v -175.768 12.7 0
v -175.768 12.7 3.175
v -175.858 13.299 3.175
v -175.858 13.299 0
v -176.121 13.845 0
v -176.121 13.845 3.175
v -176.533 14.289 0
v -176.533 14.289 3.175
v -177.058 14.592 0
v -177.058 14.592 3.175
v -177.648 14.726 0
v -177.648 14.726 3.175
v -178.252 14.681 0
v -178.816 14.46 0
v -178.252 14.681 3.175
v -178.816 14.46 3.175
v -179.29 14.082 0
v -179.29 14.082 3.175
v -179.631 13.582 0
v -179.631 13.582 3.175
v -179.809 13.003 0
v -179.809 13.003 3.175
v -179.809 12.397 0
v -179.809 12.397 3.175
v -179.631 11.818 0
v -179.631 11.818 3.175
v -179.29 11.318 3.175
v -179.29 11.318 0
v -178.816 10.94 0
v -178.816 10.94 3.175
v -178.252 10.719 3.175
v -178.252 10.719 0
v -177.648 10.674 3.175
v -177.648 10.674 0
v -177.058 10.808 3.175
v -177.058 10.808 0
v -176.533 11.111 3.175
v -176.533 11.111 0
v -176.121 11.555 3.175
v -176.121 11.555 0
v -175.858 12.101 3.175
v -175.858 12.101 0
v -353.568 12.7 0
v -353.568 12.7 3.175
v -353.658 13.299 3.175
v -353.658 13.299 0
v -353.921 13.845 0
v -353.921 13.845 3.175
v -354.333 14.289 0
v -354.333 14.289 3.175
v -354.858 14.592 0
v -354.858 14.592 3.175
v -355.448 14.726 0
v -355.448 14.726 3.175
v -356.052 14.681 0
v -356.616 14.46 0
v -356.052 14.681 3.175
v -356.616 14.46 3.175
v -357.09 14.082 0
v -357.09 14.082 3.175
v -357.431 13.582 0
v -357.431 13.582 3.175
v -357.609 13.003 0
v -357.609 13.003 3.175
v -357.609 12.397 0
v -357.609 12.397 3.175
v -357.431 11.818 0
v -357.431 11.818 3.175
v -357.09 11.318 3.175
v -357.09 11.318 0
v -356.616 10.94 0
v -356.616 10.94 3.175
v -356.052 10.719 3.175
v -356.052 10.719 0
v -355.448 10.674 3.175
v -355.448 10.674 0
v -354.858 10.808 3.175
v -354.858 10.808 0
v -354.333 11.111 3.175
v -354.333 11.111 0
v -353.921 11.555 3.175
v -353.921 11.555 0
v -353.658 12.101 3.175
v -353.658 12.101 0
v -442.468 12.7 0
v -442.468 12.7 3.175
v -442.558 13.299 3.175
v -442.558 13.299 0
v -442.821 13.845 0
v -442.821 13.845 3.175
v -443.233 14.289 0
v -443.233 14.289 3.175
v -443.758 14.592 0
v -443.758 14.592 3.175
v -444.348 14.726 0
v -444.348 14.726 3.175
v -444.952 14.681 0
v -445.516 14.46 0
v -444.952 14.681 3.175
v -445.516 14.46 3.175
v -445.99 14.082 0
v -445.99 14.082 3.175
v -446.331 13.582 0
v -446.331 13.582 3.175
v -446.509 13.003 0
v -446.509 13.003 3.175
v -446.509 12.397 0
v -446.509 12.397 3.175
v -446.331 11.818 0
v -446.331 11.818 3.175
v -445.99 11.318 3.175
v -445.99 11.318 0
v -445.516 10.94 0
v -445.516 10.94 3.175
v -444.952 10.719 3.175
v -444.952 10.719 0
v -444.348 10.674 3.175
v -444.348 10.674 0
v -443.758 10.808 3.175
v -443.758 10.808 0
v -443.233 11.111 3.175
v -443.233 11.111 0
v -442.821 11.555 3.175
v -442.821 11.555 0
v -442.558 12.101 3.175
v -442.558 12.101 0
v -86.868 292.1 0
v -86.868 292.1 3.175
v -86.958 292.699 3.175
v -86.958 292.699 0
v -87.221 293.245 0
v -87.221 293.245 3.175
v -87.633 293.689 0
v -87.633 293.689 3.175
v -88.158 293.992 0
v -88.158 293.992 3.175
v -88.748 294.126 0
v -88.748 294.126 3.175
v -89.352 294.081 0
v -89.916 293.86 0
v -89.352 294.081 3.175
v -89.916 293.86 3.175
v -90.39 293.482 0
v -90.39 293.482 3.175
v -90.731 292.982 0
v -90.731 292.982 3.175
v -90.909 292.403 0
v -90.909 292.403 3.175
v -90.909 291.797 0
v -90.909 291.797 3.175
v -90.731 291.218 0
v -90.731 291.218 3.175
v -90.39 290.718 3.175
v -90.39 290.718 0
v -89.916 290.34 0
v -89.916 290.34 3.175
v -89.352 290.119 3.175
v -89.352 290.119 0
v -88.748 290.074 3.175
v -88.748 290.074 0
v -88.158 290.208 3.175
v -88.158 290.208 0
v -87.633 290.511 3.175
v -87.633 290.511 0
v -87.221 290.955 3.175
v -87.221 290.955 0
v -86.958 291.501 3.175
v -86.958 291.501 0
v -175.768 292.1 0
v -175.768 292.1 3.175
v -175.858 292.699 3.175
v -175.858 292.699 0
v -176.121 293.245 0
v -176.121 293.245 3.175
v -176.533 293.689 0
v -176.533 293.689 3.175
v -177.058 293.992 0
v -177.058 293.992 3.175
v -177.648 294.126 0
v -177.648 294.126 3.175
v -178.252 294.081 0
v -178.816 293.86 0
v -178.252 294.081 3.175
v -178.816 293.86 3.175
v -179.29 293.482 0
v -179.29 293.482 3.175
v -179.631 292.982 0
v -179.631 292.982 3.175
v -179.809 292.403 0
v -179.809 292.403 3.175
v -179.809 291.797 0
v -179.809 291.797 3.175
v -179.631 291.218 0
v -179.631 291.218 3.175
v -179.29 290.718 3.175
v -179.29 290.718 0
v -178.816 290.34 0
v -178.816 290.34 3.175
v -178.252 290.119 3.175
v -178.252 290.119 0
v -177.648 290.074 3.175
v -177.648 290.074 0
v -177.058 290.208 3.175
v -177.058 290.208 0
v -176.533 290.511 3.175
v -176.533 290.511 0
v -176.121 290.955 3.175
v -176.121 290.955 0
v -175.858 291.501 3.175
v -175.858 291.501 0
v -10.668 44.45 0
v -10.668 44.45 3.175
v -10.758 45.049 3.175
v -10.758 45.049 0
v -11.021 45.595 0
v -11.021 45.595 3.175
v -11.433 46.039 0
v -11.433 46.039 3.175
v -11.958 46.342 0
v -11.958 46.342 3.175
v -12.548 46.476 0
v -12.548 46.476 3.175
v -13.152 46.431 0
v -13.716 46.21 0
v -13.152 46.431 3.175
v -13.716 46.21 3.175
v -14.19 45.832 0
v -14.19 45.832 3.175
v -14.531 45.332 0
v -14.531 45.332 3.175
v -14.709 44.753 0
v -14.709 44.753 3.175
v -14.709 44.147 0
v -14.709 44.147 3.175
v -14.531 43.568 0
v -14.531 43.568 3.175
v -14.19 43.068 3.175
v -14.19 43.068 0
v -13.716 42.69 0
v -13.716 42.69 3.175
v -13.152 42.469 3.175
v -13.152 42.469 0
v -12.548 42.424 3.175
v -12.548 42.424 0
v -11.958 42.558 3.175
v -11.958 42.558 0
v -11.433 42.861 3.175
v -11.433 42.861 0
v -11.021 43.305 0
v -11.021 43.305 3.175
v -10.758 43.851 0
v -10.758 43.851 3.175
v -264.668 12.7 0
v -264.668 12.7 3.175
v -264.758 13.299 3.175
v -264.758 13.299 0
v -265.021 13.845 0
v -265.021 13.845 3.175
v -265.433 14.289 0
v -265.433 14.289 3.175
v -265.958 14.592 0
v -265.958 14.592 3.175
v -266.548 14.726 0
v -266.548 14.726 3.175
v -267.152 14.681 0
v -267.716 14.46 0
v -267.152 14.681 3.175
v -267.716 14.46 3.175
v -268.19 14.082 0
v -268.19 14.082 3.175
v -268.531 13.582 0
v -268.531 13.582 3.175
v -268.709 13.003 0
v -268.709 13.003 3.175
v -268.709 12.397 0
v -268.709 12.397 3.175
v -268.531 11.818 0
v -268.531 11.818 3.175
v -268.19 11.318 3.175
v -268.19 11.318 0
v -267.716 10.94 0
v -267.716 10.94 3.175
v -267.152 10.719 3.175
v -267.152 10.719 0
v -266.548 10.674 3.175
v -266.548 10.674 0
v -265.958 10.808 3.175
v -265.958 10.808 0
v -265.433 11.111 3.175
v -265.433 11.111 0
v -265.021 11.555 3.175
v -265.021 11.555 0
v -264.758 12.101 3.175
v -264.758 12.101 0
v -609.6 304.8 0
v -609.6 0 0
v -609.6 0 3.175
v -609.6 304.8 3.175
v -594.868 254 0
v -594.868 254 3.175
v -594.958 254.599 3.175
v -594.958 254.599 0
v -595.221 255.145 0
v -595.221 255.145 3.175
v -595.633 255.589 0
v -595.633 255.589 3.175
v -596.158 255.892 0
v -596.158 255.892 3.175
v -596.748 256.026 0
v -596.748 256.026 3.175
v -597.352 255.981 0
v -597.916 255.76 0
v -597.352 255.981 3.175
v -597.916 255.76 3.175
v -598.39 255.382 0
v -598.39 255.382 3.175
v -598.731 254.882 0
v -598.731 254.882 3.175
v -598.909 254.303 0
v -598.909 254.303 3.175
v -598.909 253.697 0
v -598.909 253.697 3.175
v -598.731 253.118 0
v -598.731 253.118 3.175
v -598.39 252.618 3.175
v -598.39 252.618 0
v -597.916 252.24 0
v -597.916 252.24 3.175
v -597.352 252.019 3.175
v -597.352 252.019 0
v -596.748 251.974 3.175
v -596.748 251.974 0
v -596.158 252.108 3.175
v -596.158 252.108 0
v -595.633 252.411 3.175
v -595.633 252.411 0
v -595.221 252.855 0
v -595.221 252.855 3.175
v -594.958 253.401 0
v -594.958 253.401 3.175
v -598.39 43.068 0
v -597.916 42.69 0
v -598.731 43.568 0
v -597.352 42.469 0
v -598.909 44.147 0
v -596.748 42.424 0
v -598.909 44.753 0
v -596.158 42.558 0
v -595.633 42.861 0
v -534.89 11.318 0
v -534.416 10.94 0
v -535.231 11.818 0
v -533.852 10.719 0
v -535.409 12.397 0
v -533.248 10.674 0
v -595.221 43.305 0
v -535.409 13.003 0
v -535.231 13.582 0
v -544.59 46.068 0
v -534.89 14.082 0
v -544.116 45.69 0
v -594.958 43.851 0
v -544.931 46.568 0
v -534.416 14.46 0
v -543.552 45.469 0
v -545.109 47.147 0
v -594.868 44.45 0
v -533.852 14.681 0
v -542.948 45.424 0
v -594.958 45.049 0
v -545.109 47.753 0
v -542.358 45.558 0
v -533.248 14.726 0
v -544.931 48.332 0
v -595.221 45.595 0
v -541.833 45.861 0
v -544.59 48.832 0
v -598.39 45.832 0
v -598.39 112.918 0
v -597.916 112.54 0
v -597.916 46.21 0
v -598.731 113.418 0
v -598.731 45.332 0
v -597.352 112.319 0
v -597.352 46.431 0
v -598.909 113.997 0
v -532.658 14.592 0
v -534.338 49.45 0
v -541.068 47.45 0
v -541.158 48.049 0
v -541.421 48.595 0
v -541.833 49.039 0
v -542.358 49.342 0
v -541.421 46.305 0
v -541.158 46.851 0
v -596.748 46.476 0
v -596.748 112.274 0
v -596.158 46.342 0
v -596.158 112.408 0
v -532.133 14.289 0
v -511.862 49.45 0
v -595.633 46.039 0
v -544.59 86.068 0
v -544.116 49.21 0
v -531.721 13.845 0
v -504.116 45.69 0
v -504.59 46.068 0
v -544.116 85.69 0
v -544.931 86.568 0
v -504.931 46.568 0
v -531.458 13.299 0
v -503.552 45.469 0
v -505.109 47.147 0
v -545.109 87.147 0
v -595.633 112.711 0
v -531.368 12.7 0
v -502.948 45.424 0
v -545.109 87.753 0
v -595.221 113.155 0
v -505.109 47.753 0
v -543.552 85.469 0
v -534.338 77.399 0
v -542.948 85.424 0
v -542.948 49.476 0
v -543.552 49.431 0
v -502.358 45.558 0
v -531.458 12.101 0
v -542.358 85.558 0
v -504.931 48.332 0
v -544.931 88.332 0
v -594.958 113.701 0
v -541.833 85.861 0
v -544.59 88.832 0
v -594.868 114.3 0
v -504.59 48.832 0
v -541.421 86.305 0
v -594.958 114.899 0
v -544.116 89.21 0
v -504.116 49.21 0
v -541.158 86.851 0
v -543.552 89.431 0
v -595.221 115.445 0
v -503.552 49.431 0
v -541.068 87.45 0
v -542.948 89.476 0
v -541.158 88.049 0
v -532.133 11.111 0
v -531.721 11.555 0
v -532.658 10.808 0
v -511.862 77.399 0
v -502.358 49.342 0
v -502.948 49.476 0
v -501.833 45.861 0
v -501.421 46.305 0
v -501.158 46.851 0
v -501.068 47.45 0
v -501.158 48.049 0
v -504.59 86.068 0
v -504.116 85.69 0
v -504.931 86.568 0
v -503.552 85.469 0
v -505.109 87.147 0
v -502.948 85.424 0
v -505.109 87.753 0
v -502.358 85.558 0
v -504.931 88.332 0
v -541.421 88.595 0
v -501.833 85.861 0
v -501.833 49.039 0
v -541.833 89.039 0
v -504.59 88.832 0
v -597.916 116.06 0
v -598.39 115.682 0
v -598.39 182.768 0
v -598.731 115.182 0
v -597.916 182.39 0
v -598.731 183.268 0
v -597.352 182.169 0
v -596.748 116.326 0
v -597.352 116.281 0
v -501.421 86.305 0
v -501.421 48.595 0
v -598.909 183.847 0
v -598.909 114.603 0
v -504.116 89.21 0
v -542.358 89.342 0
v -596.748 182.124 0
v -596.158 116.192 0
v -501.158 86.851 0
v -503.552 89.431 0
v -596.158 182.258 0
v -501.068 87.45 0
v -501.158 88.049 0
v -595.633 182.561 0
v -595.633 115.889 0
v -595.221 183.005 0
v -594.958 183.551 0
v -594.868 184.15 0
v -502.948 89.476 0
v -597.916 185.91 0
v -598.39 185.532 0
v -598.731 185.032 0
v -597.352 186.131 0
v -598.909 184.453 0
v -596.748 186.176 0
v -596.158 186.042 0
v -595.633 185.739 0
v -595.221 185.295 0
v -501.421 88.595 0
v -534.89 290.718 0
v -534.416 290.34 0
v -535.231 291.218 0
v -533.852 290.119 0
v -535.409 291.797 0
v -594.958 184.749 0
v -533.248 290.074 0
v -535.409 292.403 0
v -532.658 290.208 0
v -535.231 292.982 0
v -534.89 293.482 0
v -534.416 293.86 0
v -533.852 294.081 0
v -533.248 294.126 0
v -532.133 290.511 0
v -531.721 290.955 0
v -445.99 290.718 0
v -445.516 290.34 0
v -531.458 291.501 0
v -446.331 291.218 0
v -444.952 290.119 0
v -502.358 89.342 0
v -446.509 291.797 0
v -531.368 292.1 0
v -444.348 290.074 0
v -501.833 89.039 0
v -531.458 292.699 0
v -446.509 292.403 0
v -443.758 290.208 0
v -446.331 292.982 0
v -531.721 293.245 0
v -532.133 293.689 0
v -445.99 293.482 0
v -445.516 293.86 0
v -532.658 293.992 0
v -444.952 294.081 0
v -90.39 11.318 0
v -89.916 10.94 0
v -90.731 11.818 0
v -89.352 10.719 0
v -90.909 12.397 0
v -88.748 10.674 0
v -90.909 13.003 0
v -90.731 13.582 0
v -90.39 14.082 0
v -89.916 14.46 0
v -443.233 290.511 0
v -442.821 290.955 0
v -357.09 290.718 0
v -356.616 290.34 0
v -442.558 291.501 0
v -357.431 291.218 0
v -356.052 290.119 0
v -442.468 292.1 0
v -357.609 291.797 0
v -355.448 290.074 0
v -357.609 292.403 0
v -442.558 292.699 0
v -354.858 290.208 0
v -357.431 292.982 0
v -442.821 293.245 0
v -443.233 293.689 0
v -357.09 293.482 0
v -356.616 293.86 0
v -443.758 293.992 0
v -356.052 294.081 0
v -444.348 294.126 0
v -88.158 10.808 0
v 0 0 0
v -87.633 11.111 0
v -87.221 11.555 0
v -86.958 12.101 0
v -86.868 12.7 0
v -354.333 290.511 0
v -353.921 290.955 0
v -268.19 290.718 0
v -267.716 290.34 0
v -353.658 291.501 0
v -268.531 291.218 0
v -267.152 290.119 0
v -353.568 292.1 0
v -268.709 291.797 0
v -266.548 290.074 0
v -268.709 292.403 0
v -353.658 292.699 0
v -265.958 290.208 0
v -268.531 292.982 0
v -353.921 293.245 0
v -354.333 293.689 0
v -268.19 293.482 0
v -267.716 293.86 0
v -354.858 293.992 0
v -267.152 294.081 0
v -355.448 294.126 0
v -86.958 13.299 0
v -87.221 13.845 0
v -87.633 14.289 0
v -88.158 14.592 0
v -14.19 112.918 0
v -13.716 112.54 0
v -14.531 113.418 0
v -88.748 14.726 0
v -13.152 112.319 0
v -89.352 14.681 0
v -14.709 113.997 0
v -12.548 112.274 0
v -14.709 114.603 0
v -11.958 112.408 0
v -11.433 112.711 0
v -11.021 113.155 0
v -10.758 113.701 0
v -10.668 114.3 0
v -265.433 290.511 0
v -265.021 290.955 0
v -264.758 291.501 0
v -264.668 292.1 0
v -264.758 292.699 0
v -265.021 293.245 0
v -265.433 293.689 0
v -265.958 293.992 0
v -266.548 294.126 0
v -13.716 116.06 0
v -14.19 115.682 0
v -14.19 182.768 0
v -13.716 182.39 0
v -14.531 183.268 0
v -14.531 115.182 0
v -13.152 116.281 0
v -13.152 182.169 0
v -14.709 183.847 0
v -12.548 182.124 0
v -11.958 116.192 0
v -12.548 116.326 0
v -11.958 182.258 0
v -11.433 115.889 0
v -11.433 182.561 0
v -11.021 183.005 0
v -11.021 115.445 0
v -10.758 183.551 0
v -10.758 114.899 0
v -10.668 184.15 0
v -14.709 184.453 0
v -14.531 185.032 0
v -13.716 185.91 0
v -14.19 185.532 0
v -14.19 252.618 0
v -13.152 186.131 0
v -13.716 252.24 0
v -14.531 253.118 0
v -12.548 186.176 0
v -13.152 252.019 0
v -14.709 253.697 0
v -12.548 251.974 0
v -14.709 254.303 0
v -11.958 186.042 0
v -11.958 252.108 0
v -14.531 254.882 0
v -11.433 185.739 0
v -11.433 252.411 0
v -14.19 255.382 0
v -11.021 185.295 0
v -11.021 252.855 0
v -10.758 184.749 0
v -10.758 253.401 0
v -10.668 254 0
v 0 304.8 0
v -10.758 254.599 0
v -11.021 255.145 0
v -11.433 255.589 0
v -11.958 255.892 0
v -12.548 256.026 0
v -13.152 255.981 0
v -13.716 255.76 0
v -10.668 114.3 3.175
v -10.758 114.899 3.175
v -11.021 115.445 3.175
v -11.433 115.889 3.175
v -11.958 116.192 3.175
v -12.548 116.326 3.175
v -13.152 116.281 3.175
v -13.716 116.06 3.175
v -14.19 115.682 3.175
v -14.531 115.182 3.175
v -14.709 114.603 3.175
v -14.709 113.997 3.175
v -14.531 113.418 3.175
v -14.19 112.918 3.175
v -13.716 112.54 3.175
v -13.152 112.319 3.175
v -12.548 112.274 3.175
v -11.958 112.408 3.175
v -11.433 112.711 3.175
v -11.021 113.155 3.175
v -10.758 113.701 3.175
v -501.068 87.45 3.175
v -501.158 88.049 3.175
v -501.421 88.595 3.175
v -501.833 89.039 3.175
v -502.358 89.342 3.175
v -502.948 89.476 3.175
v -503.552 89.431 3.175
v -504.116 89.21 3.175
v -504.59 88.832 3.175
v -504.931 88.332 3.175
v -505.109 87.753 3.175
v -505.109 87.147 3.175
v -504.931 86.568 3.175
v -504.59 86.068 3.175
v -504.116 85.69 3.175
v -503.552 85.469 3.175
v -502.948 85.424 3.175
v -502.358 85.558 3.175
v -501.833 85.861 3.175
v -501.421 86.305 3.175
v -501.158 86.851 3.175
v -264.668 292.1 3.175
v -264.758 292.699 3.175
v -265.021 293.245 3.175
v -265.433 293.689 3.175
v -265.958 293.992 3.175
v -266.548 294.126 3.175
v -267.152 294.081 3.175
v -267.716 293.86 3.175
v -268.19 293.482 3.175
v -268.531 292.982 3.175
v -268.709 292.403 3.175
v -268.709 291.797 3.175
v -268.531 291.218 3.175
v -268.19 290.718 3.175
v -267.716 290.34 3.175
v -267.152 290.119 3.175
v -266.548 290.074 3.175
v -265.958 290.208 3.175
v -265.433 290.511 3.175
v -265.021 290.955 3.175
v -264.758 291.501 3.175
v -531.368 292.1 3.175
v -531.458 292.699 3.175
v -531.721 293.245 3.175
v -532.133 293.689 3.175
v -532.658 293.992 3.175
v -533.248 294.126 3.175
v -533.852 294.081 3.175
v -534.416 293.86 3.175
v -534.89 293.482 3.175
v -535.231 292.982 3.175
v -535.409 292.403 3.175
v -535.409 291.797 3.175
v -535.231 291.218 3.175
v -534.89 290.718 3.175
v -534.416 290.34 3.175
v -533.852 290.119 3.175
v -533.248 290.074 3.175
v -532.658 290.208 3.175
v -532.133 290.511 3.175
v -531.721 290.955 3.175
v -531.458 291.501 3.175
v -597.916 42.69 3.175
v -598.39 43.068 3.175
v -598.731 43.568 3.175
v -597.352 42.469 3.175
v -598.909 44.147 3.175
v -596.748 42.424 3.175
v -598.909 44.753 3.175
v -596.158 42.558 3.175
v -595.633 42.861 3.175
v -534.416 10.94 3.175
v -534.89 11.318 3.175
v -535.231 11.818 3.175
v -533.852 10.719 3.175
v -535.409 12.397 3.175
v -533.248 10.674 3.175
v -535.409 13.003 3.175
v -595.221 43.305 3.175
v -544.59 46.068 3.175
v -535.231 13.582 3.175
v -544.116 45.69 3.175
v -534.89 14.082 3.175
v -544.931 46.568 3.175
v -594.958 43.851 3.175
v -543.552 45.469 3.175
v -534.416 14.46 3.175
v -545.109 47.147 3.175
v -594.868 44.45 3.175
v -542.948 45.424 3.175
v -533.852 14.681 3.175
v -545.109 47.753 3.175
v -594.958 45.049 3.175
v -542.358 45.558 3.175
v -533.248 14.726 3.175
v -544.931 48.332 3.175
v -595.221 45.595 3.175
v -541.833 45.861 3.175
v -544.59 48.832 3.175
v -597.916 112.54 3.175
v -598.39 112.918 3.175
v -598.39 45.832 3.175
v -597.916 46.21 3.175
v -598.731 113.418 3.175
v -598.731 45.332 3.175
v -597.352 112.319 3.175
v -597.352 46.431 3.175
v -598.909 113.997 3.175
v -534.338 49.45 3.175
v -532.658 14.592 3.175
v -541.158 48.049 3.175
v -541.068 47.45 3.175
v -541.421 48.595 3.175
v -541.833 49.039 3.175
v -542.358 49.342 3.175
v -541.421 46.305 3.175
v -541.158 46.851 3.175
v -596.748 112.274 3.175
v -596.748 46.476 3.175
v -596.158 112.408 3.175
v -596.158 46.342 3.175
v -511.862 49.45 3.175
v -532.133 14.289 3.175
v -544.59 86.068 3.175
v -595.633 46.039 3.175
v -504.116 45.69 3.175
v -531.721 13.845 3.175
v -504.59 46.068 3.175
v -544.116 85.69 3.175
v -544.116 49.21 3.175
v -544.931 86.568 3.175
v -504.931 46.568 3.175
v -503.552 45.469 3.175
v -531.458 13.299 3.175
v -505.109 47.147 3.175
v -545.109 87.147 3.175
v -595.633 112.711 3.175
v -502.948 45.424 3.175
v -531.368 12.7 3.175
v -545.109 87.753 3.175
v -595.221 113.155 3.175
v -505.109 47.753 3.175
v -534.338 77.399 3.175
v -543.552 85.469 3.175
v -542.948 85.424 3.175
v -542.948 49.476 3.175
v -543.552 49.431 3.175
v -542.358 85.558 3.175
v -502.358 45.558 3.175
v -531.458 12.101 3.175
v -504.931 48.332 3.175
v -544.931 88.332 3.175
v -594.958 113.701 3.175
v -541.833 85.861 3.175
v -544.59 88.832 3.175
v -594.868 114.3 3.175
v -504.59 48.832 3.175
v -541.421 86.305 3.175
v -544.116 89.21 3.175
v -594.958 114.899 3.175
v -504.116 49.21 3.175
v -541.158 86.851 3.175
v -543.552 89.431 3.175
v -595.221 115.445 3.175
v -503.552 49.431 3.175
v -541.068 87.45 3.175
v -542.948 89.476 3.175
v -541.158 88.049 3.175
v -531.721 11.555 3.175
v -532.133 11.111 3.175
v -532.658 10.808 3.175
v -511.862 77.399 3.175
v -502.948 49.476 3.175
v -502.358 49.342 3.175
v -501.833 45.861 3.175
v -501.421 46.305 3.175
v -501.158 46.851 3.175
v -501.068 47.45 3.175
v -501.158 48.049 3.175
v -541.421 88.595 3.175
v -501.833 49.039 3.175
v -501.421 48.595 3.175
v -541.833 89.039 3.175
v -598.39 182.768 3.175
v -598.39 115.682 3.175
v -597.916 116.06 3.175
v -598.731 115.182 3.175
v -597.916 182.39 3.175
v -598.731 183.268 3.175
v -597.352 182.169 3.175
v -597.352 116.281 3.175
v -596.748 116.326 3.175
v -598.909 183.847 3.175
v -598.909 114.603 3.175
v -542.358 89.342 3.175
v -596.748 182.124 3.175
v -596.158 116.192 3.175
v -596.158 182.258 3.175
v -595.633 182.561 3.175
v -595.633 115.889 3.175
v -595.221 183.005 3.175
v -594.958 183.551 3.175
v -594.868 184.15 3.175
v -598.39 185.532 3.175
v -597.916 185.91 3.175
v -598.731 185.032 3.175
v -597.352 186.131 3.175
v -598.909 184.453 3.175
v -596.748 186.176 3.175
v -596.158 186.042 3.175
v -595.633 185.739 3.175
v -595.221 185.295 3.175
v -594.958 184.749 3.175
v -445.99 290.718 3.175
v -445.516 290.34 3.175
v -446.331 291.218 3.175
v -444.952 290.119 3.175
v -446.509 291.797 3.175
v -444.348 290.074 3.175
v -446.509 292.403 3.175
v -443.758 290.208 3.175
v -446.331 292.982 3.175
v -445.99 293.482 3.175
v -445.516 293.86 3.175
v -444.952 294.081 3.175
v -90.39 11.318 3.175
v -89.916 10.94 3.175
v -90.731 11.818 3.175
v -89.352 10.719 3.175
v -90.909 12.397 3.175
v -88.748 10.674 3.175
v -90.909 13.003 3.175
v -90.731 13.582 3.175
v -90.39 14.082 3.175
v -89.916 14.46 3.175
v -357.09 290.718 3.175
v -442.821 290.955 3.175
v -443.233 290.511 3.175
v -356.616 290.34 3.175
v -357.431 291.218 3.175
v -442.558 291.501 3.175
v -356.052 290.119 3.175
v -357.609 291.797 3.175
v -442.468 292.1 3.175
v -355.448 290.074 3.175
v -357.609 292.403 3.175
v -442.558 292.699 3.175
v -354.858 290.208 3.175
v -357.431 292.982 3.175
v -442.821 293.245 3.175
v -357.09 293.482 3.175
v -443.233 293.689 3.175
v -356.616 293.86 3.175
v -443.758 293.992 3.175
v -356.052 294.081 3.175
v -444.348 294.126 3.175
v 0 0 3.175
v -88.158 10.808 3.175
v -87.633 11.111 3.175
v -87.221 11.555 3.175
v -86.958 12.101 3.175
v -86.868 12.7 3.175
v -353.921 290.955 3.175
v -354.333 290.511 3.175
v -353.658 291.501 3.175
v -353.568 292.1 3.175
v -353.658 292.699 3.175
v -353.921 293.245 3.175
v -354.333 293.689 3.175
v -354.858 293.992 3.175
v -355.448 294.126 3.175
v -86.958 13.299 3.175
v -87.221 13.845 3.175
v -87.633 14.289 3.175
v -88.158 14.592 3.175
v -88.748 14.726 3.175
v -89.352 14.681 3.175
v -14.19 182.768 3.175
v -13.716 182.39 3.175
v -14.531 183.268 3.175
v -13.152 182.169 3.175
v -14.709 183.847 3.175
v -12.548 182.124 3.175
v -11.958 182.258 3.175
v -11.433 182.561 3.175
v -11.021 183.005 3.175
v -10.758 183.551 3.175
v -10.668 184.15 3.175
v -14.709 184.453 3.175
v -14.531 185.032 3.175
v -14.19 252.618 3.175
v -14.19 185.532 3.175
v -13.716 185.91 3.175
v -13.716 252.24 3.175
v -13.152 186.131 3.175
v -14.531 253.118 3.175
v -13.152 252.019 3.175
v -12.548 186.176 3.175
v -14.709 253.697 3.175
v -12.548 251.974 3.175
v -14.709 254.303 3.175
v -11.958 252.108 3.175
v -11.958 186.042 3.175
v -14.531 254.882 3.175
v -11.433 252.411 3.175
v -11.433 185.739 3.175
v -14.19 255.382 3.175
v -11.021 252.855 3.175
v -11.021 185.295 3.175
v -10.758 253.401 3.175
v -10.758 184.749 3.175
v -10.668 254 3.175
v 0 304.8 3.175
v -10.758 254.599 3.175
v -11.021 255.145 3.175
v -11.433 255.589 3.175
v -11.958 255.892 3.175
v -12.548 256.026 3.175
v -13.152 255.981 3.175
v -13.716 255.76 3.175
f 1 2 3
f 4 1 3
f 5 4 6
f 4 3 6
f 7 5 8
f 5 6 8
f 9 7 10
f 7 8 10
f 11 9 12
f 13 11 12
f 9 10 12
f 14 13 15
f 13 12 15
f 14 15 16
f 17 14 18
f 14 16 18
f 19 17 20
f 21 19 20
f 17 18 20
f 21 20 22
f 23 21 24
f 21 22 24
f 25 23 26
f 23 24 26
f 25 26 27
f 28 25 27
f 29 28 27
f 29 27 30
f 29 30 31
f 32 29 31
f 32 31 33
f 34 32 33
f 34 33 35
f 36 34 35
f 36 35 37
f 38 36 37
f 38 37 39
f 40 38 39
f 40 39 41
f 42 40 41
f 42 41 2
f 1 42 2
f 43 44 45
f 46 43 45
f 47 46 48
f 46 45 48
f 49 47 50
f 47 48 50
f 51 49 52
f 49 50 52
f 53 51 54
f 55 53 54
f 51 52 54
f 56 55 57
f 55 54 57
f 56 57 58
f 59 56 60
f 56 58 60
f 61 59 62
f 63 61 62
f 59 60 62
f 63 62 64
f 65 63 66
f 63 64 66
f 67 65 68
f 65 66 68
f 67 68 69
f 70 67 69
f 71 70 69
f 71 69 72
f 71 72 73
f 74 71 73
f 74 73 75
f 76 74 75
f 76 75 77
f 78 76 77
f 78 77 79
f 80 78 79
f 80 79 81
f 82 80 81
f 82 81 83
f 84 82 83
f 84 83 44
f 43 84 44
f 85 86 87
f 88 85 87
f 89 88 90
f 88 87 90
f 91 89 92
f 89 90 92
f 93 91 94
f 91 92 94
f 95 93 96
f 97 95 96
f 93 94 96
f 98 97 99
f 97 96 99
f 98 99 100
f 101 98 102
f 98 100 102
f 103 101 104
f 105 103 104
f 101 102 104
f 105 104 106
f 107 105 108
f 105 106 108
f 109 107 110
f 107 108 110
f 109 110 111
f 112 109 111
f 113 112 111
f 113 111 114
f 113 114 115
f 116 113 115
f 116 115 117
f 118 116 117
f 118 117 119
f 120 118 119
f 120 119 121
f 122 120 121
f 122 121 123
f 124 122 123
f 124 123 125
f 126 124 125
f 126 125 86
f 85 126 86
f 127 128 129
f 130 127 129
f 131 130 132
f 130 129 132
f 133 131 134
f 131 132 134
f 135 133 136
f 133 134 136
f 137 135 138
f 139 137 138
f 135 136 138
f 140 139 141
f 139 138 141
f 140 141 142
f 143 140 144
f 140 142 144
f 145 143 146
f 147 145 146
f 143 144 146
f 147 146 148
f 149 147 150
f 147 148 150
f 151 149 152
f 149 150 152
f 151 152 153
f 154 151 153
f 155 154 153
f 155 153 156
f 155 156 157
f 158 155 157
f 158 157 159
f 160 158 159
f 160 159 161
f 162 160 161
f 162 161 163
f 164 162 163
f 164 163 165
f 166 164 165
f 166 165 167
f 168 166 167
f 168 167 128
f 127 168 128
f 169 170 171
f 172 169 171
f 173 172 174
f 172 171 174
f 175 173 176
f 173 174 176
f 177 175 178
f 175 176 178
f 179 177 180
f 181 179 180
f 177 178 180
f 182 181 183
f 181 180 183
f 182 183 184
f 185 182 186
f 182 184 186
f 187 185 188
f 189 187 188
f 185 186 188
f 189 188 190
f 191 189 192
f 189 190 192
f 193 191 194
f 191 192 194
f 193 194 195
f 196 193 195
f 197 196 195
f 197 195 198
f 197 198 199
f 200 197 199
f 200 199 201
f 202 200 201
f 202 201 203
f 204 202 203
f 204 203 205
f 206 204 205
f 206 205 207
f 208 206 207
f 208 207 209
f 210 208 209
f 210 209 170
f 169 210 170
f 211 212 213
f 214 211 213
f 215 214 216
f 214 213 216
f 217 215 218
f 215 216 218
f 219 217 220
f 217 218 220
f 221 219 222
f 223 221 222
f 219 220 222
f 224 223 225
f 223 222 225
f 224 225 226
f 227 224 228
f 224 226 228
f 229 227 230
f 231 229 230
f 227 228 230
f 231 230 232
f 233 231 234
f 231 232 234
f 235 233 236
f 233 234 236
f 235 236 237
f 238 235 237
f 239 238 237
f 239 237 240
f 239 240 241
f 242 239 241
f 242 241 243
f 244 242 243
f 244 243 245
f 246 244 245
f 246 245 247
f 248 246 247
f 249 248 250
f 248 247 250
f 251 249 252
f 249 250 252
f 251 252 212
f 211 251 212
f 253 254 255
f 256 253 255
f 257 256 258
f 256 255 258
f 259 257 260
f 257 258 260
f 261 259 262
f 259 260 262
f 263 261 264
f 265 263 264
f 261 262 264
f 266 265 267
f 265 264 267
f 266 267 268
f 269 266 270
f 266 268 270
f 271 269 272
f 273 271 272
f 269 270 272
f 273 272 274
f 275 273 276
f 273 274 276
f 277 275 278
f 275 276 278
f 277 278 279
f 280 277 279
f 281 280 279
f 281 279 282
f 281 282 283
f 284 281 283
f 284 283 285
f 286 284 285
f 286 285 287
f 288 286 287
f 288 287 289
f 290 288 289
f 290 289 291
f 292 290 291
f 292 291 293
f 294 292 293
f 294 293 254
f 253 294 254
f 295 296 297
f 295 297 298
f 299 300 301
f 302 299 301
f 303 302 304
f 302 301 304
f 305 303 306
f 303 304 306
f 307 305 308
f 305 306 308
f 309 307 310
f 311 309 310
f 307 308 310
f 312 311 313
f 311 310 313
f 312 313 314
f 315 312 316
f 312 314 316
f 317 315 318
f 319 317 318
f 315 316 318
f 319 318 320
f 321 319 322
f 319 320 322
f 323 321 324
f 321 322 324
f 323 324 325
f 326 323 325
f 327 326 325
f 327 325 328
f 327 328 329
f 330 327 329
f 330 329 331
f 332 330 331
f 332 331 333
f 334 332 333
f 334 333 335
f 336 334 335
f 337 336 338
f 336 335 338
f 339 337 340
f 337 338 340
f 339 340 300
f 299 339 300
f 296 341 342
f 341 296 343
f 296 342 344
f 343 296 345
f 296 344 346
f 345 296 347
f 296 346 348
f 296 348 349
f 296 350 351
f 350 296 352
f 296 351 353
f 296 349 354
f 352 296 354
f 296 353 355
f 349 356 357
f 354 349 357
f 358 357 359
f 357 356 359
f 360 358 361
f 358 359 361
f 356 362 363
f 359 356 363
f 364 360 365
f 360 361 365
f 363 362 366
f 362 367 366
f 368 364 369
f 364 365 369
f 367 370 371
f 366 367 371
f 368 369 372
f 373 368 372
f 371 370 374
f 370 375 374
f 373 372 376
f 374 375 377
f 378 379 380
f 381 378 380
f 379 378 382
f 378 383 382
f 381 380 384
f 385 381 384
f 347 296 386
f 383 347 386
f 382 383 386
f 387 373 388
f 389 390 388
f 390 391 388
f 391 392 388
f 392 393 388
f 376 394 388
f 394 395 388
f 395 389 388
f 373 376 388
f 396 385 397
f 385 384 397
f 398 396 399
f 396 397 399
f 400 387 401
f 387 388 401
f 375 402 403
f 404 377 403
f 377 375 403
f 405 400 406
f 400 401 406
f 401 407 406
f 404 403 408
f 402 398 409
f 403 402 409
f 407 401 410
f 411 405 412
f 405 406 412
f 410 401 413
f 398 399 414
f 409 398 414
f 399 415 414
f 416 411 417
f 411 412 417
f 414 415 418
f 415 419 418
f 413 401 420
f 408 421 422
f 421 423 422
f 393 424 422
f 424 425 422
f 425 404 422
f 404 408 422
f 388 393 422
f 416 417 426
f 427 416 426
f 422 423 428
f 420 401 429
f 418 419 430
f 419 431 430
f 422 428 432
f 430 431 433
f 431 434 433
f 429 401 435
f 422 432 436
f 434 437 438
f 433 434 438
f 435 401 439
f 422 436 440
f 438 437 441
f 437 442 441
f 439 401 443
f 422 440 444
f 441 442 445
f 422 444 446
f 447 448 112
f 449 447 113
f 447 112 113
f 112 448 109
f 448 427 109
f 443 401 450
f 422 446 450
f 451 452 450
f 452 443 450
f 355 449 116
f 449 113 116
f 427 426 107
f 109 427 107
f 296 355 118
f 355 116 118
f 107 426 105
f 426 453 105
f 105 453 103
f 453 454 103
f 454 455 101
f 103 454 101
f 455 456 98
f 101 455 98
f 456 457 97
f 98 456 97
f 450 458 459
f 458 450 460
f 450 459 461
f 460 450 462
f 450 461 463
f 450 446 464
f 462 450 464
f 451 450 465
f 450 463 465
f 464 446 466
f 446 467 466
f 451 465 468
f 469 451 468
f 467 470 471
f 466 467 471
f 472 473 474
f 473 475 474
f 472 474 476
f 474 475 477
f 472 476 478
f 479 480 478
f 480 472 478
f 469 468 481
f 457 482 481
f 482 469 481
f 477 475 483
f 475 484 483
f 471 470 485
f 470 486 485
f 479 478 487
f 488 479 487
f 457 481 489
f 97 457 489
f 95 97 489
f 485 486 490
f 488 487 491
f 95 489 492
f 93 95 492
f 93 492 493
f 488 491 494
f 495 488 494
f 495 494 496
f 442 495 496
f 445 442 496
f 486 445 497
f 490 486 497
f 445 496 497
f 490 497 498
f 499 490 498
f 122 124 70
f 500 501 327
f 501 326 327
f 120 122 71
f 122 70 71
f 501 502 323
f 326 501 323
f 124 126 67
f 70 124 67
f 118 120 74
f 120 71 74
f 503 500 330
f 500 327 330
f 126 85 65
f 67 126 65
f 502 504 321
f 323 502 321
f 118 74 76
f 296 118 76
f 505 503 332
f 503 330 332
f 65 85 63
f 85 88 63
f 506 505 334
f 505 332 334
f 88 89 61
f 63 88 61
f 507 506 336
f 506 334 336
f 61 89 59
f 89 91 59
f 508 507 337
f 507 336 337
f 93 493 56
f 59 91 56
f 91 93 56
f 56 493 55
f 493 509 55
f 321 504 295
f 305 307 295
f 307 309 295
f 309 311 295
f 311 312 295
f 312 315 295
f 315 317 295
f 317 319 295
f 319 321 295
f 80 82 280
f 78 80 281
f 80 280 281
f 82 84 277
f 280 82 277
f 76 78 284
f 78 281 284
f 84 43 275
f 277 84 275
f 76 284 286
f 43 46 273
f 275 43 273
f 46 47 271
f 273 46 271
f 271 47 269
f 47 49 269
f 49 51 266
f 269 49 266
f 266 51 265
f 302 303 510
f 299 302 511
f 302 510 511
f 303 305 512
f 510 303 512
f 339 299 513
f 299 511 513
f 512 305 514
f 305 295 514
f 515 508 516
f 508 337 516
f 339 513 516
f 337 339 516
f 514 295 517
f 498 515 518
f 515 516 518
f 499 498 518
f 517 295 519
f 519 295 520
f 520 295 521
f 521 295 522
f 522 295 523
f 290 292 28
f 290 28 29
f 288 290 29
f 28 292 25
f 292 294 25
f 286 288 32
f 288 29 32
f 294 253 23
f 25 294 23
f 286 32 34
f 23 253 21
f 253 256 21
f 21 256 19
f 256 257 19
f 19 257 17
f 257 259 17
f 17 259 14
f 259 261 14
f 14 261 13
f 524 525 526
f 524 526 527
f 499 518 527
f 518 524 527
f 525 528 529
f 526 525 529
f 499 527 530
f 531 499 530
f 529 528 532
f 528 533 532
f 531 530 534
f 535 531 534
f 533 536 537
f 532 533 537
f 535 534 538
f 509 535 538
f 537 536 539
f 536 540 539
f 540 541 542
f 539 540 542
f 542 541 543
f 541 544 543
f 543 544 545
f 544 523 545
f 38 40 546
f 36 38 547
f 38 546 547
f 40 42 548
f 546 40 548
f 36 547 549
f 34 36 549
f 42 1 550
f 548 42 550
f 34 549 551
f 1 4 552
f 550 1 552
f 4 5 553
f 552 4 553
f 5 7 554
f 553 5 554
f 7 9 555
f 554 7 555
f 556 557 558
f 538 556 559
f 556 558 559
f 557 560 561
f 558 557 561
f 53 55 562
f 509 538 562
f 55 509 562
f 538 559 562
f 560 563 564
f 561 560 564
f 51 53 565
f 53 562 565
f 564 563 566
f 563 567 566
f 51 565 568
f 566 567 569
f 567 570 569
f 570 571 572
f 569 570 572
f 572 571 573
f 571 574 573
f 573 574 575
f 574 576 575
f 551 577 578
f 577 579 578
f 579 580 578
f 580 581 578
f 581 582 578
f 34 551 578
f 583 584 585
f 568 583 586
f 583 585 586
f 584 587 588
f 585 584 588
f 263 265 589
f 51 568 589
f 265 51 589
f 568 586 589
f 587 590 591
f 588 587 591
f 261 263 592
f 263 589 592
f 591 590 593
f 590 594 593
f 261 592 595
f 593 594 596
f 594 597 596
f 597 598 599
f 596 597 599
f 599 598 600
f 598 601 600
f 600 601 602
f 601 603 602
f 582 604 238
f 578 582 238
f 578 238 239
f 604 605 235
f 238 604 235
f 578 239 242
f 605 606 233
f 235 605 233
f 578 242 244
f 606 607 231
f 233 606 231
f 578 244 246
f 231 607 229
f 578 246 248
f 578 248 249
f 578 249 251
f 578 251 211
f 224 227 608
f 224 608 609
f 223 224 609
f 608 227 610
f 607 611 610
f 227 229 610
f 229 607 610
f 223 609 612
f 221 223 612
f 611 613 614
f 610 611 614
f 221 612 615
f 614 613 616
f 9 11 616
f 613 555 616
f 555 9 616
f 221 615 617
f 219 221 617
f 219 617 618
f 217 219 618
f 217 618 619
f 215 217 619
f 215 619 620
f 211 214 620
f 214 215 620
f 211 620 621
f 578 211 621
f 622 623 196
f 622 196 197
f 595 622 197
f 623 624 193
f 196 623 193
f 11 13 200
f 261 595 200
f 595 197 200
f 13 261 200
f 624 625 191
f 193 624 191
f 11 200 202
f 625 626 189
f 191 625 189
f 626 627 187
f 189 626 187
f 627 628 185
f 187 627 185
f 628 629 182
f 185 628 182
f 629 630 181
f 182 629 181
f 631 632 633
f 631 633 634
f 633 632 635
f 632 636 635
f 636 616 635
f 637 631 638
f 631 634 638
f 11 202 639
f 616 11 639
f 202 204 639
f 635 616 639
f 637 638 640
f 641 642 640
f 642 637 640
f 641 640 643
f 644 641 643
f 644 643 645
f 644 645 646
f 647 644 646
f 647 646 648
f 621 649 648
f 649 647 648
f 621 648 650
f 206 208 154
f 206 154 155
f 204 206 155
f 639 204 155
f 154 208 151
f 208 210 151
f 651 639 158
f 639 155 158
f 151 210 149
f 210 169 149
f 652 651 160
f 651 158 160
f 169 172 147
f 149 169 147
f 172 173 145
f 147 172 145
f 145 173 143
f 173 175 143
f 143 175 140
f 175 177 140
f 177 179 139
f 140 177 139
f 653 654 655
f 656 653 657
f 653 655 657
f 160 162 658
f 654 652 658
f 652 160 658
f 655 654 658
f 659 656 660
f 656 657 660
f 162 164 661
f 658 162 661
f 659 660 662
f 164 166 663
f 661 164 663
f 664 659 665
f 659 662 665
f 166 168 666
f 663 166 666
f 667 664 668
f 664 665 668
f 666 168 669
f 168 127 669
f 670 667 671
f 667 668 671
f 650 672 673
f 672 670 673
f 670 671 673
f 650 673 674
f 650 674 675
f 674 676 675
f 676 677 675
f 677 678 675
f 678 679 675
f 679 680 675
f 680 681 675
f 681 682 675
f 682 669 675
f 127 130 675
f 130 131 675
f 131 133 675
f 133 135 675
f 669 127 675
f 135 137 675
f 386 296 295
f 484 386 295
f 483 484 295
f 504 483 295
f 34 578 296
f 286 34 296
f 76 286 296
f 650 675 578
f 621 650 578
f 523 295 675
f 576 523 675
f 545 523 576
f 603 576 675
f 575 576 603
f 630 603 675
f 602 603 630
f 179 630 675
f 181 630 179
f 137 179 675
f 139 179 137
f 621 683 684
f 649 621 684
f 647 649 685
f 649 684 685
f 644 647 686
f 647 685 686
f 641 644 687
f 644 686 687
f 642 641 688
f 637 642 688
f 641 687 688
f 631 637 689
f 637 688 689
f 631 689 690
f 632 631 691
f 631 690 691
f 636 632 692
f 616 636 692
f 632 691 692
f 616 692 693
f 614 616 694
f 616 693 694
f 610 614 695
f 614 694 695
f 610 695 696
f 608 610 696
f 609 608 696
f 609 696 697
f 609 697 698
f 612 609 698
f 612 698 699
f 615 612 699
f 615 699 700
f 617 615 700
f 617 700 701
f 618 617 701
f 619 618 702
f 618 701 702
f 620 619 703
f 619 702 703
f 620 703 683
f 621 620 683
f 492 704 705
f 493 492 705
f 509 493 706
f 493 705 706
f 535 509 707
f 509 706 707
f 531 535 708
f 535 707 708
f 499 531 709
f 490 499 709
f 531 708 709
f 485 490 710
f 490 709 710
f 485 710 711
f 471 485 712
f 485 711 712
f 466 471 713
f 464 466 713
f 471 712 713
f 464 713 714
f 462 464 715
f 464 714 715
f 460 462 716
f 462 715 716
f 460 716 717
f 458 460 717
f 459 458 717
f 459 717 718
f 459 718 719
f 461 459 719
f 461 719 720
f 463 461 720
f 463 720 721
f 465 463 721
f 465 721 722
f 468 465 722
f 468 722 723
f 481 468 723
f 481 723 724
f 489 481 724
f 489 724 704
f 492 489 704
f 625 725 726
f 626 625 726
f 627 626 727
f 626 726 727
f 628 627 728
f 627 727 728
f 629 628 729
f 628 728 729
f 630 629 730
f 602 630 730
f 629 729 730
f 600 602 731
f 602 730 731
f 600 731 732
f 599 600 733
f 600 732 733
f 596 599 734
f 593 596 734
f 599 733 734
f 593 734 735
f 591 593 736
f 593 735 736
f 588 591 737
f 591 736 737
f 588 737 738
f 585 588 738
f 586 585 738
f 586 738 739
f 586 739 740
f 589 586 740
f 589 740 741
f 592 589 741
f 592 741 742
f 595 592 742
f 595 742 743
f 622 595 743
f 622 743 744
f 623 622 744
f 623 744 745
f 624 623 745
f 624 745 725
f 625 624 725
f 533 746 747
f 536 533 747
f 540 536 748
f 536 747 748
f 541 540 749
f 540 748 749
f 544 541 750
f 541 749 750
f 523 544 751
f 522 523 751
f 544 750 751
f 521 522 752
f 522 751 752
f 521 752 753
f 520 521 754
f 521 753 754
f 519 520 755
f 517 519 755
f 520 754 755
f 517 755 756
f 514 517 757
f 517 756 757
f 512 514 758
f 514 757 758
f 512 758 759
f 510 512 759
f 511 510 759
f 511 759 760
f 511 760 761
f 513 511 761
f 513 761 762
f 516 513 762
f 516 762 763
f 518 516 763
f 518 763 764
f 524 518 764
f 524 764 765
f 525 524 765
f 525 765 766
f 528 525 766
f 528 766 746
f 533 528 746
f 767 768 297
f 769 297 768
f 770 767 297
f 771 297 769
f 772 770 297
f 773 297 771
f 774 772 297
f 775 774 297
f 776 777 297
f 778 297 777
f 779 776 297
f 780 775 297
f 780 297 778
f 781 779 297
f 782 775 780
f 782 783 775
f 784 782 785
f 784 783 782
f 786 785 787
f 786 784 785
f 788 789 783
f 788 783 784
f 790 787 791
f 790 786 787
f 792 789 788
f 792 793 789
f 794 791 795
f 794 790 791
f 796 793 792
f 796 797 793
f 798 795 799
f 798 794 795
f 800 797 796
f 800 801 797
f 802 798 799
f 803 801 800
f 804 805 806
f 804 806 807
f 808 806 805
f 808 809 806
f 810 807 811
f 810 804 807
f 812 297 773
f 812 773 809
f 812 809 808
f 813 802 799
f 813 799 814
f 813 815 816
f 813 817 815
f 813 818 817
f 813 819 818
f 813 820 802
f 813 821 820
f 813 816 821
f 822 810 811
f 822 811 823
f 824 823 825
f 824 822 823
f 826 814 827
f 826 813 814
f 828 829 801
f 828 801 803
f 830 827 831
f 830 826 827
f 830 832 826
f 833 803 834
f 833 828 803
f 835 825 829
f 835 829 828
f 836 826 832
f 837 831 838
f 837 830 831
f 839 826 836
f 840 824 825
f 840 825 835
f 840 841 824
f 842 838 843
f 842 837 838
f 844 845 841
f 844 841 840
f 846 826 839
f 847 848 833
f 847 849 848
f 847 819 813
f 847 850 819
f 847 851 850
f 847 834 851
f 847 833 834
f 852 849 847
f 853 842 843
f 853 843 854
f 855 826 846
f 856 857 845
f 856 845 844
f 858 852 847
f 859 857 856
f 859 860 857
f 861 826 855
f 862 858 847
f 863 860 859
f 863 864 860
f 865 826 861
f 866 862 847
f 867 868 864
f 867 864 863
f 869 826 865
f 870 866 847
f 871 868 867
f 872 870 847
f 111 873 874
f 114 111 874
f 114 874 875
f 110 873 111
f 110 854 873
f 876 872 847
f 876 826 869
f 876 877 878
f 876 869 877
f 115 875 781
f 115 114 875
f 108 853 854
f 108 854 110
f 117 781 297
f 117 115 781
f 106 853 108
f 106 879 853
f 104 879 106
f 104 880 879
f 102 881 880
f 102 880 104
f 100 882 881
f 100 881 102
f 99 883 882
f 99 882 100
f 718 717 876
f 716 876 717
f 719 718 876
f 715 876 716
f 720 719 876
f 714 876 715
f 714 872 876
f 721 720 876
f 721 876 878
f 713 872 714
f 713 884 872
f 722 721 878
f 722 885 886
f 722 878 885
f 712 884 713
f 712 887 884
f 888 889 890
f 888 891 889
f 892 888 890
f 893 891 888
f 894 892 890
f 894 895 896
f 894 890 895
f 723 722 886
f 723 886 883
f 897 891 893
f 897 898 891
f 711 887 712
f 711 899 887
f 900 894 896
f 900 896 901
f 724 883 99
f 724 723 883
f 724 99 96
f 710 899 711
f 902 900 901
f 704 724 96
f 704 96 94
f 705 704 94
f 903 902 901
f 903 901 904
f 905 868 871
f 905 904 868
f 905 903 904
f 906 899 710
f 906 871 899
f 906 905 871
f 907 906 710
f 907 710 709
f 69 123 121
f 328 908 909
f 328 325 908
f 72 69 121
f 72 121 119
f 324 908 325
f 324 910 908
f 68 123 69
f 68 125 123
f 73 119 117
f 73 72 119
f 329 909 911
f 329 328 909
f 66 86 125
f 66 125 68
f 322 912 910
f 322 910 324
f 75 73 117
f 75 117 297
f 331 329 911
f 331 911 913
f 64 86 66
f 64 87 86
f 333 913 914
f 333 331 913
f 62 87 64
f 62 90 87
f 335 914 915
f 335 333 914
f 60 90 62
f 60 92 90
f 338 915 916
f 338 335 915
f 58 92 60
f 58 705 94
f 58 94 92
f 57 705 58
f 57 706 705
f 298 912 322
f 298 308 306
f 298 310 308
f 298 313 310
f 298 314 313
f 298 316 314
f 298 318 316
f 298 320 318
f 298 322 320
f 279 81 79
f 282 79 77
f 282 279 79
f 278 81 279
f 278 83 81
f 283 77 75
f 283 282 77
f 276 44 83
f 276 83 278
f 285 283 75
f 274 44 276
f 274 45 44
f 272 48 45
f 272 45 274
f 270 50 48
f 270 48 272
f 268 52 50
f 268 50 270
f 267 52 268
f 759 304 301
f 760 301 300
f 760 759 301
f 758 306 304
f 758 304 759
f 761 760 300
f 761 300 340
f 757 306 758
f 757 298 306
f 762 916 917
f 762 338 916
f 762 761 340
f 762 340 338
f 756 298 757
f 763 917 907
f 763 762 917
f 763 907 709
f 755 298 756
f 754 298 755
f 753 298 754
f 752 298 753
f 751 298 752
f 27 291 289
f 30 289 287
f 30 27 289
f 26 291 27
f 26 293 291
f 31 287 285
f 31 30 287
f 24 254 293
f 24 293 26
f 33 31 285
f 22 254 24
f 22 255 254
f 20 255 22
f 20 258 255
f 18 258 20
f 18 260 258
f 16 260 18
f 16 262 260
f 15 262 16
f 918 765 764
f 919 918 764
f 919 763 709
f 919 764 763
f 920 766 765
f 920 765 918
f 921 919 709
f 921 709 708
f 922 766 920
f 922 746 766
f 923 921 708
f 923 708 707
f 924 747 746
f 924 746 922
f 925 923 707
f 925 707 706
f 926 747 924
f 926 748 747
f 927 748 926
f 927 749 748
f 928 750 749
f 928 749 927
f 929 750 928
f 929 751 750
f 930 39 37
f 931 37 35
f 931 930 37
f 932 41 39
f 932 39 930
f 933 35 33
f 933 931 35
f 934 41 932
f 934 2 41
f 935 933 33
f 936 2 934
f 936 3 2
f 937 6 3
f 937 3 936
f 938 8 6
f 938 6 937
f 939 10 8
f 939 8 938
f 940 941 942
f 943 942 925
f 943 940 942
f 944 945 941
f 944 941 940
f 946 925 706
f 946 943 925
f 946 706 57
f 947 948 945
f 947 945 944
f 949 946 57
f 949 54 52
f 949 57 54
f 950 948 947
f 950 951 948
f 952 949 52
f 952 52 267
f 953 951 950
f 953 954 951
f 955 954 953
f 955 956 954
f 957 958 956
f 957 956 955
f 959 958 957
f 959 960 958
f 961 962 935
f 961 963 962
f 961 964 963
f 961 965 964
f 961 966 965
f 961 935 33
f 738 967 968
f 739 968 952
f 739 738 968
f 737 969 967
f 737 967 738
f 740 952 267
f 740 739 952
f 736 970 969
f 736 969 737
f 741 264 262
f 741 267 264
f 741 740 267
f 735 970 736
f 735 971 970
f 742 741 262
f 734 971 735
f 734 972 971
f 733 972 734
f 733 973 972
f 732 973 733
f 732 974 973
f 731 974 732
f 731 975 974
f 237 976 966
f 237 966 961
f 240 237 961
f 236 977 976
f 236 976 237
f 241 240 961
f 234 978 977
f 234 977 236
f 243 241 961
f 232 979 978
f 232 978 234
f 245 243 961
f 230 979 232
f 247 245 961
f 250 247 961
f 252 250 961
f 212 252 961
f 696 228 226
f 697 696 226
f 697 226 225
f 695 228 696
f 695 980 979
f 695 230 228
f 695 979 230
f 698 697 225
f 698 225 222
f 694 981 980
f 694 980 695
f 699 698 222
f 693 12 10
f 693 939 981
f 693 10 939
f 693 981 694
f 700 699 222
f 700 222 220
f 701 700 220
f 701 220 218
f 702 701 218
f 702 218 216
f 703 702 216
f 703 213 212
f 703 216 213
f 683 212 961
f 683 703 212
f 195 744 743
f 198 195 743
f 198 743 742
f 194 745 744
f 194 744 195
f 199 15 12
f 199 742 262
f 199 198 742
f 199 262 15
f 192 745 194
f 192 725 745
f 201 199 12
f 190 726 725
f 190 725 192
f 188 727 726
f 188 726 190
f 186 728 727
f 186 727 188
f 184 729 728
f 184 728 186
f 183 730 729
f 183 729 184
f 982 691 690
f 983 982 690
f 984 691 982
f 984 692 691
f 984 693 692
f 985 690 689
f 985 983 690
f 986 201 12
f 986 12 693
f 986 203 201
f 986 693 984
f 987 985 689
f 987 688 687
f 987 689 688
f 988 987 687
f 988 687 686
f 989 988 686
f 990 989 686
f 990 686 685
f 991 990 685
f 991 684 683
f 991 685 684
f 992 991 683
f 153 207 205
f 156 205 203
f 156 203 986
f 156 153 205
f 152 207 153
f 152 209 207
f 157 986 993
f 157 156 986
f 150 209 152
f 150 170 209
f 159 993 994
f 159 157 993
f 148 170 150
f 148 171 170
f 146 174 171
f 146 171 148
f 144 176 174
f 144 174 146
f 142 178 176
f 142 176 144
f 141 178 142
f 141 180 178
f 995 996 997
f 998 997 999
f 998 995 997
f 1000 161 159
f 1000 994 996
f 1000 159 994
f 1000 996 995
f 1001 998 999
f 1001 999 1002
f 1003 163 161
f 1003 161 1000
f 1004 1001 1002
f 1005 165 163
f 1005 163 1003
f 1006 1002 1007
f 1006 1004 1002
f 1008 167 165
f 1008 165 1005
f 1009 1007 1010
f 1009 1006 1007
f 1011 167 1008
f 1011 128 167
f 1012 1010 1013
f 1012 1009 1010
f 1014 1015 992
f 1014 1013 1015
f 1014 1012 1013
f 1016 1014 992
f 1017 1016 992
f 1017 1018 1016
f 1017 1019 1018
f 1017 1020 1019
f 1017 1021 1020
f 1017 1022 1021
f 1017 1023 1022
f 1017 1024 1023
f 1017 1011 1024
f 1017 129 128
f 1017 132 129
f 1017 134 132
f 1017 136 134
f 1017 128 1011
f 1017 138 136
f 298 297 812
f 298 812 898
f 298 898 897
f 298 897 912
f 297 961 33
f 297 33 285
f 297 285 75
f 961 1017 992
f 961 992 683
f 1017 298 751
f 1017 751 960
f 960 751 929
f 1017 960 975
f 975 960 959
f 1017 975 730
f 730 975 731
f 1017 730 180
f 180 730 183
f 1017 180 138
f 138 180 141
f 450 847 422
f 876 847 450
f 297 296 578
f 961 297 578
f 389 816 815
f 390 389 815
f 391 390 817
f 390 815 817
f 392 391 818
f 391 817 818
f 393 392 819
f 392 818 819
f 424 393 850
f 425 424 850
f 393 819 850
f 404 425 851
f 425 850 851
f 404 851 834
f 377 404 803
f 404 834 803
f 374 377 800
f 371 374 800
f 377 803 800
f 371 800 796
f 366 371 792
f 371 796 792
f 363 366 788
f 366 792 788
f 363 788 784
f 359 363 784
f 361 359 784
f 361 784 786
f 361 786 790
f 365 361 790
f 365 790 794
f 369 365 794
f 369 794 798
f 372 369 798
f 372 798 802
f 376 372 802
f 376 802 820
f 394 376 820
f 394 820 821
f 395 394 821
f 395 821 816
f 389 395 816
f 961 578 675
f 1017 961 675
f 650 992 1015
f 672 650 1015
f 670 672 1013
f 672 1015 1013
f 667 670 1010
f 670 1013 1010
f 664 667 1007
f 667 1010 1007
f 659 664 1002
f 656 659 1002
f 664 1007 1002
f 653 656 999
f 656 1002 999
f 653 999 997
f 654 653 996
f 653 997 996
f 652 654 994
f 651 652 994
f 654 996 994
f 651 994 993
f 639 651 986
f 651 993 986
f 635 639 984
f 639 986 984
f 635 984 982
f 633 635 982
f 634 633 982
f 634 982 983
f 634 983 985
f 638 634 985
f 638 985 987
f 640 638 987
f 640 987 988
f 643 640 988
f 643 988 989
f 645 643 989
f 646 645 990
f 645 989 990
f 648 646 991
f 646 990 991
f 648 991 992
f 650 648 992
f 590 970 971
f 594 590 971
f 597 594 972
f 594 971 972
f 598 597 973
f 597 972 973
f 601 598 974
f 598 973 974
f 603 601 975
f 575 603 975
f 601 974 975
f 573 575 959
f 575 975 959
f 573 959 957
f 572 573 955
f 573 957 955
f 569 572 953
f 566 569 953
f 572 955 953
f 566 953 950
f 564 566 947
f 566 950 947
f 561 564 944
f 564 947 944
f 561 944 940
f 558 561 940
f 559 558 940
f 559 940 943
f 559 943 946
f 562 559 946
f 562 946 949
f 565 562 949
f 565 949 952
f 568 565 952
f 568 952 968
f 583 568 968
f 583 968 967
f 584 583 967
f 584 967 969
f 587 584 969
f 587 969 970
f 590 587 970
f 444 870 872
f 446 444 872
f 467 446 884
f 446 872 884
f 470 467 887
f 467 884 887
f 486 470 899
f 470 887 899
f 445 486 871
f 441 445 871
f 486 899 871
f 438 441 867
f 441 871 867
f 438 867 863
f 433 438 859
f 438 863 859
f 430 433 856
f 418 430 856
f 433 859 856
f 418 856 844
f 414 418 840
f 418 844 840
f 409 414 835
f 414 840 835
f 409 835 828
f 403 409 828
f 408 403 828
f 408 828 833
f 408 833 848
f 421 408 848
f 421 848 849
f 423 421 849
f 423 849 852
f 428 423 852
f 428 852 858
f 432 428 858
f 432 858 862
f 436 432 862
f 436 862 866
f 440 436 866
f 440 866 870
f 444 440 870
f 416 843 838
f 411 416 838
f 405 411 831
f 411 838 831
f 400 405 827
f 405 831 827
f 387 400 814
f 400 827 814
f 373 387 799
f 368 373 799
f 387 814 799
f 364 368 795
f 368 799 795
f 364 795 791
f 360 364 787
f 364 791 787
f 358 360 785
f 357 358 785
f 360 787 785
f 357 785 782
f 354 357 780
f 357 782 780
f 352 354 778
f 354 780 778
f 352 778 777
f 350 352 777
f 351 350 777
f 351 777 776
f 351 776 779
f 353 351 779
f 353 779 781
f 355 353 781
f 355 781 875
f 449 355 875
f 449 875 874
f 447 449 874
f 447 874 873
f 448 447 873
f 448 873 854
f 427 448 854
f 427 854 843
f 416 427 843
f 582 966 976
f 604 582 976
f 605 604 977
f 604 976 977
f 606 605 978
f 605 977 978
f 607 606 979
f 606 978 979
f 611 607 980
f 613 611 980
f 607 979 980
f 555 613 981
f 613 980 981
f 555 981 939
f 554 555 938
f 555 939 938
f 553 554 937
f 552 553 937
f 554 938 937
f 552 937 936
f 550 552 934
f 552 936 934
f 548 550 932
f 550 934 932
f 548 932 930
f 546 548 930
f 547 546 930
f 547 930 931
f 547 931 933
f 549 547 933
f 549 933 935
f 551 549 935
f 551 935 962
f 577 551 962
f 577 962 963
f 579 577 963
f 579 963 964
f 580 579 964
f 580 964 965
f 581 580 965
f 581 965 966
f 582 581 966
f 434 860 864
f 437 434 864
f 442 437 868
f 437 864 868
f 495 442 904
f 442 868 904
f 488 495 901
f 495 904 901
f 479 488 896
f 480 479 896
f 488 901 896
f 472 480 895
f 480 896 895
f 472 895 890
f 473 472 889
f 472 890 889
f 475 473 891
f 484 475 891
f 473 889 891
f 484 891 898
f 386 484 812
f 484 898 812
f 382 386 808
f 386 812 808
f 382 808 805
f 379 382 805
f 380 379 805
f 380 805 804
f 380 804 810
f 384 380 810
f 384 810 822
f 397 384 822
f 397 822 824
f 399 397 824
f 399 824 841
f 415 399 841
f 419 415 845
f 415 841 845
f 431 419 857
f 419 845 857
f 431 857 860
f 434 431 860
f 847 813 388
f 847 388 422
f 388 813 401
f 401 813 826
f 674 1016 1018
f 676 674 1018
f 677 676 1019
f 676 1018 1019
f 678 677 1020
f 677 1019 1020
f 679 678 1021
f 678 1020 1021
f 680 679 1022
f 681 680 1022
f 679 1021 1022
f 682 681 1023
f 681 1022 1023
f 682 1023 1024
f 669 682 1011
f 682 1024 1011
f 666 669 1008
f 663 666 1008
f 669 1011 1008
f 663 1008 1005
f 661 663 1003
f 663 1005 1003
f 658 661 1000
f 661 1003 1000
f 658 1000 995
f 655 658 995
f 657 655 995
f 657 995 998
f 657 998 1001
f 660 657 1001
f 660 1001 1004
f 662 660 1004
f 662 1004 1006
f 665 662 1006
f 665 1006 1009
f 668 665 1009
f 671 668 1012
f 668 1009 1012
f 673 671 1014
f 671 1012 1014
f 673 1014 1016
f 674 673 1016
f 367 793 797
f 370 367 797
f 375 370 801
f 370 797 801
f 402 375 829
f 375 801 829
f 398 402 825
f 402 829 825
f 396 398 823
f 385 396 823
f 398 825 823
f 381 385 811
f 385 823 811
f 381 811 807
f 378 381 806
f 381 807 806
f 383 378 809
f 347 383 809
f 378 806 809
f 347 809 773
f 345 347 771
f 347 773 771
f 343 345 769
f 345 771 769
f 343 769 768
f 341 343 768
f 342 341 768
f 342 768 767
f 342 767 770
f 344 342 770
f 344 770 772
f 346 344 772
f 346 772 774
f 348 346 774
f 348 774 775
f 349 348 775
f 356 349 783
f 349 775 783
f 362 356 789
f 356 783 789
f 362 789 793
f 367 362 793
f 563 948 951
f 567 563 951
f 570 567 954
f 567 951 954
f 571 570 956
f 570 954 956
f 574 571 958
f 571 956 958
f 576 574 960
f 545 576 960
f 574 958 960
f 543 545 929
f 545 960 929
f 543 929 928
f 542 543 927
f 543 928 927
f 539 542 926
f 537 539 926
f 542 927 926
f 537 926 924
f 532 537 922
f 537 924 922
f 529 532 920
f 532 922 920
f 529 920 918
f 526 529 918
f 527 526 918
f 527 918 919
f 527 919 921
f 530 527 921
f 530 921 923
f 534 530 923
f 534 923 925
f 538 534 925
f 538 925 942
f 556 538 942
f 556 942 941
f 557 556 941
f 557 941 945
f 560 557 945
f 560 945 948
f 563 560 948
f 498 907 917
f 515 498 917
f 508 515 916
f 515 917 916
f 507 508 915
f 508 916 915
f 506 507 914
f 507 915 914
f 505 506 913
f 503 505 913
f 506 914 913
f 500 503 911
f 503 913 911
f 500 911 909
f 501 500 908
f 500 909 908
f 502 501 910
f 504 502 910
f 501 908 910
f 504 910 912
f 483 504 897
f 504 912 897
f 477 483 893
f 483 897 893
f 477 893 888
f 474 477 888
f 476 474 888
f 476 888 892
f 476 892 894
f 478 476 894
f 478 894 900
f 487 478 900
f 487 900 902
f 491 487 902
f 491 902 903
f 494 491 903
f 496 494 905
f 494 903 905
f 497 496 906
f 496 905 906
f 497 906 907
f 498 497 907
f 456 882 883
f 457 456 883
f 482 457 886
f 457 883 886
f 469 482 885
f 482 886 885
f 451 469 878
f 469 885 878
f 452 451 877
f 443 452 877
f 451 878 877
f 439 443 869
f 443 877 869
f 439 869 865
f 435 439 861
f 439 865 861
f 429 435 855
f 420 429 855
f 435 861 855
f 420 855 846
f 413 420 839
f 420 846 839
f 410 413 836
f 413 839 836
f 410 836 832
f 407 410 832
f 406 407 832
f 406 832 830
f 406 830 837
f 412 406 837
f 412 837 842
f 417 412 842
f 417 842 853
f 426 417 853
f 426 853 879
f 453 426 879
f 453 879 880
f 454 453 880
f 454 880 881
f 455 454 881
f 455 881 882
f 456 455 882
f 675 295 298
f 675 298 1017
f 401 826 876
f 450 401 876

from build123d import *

# Parameters (mm, degrees)
SKETCH1_W           = 609.6
SKETCH1_H           = 304.8
BOSS_EXTRUDE1_DEPTH = 3.175
SKETCH5_R           = 2.032
CUT_EXTRUDE4_DEPTH  = 4.175
SKETCH6_R           = 2.032
CUT_EXTRUDE5_DEPTH  = 3.175
SKETCH7_R           = 2.032
SKETCH7_W           = 22.476650202
SKETCH7_H           = 27.949336331
CUT_EXTRUDE7_DEPTH  = 4.175


with BuildPart() as part:
    # Sketch1 → Boss-Extrude1 (new body)
    with BuildSketch(Plane.XY):
        with Locations((-304.8, 152.4)):
            Rectangle(SKETCH1_W, SKETCH1_H)
    extrude(amount=BOSS_EXTRUDE1_DEPTH)

    # Sketch5 → Cut-Extrude4 (cut, through all)
    with BuildSketch(Plane.XY.offset(3.175)):
        with Locations((-533.4, 12.7)):
            Circle(SKETCH5_R)
        with Locations((-444.5, 12.7)):
            Circle(SKETCH5_R)
        with Locations((-355.6, 12.7)):
            Circle(SKETCH5_R)
        with Locations((-266.7, 12.7)):
            Circle(SKETCH5_R)
        with Locations((-177.8, 12.7)):
            Circle(SKETCH5_R)
        with Locations((-88.9, 12.7)):
            Circle(SKETCH5_R)
        with Locations((-88.9, 292.1)):
            Circle(SKETCH5_R)
        with Locations((-177.8, 292.1)):
            Circle(SKETCH5_R)
        with Locations((-266.7, 292.1)):
            Circle(SKETCH5_R)
        with Locations((-355.6, 292.1)):
            Circle(SKETCH5_R)
        with Locations((-444.5, 292.1)):
            Circle(SKETCH5_R)
        with Locations((-533.4, 292.1)):
            Circle(SKETCH5_R)
    extrude(amount=-CUT_EXTRUDE4_DEPTH, mode=Mode.SUBTRACT)

    # Sketch6 → Cut-Extrude5 (cut)
    with BuildSketch(Plane.XY.offset(3.175)):
        with Locations((-596.9, 254)):
            Circle(SKETCH6_R)
        with Locations((-596.9, 184.15)):
            Circle(SKETCH6_R)
        with Locations((-596.9, 114.3)):
            Circle(SKETCH6_R)
        with Locations((-596.9, 44.45)):
            Circle(SKETCH6_R)
        with Locations((-12.7, 44.45)):
            Circle(SKETCH6_R)
        with Locations((-12.7, 114.3)):
            Circle(SKETCH6_R)
        with Locations((-12.7, 184.15)):
            Circle(SKETCH6_R)
        with Locations((-12.7, 254)):
            Circle(SKETCH6_R)
    extrude(amount=-CUT_EXTRUDE5_DEPTH, mode=Mode.SUBTRACT)

    # Sketch7 → Cut-Extrude7 (cut, through all)
    with BuildSketch(Plane.XY.offset(3.175)):
        with Locations((-543.1, 87.45)):
            Circle(SKETCH7_R)
        with Locations((-503.1, 87.45)):
            Circle(SKETCH7_R)
        with Locations((-503.1, 47.45)):
            Circle(SKETCH7_R)
        with Locations((-543.1, 47.45)):
            Circle(SKETCH7_R)
        with Locations((-523.1, 63.424668166)):
            Rectangle(SKETCH7_W, SKETCH7_H)
    extrude(amount=-CUT_EXTRUDE7_DEPTH, mode=Mode.SUBTRACT)


solid = part.part
